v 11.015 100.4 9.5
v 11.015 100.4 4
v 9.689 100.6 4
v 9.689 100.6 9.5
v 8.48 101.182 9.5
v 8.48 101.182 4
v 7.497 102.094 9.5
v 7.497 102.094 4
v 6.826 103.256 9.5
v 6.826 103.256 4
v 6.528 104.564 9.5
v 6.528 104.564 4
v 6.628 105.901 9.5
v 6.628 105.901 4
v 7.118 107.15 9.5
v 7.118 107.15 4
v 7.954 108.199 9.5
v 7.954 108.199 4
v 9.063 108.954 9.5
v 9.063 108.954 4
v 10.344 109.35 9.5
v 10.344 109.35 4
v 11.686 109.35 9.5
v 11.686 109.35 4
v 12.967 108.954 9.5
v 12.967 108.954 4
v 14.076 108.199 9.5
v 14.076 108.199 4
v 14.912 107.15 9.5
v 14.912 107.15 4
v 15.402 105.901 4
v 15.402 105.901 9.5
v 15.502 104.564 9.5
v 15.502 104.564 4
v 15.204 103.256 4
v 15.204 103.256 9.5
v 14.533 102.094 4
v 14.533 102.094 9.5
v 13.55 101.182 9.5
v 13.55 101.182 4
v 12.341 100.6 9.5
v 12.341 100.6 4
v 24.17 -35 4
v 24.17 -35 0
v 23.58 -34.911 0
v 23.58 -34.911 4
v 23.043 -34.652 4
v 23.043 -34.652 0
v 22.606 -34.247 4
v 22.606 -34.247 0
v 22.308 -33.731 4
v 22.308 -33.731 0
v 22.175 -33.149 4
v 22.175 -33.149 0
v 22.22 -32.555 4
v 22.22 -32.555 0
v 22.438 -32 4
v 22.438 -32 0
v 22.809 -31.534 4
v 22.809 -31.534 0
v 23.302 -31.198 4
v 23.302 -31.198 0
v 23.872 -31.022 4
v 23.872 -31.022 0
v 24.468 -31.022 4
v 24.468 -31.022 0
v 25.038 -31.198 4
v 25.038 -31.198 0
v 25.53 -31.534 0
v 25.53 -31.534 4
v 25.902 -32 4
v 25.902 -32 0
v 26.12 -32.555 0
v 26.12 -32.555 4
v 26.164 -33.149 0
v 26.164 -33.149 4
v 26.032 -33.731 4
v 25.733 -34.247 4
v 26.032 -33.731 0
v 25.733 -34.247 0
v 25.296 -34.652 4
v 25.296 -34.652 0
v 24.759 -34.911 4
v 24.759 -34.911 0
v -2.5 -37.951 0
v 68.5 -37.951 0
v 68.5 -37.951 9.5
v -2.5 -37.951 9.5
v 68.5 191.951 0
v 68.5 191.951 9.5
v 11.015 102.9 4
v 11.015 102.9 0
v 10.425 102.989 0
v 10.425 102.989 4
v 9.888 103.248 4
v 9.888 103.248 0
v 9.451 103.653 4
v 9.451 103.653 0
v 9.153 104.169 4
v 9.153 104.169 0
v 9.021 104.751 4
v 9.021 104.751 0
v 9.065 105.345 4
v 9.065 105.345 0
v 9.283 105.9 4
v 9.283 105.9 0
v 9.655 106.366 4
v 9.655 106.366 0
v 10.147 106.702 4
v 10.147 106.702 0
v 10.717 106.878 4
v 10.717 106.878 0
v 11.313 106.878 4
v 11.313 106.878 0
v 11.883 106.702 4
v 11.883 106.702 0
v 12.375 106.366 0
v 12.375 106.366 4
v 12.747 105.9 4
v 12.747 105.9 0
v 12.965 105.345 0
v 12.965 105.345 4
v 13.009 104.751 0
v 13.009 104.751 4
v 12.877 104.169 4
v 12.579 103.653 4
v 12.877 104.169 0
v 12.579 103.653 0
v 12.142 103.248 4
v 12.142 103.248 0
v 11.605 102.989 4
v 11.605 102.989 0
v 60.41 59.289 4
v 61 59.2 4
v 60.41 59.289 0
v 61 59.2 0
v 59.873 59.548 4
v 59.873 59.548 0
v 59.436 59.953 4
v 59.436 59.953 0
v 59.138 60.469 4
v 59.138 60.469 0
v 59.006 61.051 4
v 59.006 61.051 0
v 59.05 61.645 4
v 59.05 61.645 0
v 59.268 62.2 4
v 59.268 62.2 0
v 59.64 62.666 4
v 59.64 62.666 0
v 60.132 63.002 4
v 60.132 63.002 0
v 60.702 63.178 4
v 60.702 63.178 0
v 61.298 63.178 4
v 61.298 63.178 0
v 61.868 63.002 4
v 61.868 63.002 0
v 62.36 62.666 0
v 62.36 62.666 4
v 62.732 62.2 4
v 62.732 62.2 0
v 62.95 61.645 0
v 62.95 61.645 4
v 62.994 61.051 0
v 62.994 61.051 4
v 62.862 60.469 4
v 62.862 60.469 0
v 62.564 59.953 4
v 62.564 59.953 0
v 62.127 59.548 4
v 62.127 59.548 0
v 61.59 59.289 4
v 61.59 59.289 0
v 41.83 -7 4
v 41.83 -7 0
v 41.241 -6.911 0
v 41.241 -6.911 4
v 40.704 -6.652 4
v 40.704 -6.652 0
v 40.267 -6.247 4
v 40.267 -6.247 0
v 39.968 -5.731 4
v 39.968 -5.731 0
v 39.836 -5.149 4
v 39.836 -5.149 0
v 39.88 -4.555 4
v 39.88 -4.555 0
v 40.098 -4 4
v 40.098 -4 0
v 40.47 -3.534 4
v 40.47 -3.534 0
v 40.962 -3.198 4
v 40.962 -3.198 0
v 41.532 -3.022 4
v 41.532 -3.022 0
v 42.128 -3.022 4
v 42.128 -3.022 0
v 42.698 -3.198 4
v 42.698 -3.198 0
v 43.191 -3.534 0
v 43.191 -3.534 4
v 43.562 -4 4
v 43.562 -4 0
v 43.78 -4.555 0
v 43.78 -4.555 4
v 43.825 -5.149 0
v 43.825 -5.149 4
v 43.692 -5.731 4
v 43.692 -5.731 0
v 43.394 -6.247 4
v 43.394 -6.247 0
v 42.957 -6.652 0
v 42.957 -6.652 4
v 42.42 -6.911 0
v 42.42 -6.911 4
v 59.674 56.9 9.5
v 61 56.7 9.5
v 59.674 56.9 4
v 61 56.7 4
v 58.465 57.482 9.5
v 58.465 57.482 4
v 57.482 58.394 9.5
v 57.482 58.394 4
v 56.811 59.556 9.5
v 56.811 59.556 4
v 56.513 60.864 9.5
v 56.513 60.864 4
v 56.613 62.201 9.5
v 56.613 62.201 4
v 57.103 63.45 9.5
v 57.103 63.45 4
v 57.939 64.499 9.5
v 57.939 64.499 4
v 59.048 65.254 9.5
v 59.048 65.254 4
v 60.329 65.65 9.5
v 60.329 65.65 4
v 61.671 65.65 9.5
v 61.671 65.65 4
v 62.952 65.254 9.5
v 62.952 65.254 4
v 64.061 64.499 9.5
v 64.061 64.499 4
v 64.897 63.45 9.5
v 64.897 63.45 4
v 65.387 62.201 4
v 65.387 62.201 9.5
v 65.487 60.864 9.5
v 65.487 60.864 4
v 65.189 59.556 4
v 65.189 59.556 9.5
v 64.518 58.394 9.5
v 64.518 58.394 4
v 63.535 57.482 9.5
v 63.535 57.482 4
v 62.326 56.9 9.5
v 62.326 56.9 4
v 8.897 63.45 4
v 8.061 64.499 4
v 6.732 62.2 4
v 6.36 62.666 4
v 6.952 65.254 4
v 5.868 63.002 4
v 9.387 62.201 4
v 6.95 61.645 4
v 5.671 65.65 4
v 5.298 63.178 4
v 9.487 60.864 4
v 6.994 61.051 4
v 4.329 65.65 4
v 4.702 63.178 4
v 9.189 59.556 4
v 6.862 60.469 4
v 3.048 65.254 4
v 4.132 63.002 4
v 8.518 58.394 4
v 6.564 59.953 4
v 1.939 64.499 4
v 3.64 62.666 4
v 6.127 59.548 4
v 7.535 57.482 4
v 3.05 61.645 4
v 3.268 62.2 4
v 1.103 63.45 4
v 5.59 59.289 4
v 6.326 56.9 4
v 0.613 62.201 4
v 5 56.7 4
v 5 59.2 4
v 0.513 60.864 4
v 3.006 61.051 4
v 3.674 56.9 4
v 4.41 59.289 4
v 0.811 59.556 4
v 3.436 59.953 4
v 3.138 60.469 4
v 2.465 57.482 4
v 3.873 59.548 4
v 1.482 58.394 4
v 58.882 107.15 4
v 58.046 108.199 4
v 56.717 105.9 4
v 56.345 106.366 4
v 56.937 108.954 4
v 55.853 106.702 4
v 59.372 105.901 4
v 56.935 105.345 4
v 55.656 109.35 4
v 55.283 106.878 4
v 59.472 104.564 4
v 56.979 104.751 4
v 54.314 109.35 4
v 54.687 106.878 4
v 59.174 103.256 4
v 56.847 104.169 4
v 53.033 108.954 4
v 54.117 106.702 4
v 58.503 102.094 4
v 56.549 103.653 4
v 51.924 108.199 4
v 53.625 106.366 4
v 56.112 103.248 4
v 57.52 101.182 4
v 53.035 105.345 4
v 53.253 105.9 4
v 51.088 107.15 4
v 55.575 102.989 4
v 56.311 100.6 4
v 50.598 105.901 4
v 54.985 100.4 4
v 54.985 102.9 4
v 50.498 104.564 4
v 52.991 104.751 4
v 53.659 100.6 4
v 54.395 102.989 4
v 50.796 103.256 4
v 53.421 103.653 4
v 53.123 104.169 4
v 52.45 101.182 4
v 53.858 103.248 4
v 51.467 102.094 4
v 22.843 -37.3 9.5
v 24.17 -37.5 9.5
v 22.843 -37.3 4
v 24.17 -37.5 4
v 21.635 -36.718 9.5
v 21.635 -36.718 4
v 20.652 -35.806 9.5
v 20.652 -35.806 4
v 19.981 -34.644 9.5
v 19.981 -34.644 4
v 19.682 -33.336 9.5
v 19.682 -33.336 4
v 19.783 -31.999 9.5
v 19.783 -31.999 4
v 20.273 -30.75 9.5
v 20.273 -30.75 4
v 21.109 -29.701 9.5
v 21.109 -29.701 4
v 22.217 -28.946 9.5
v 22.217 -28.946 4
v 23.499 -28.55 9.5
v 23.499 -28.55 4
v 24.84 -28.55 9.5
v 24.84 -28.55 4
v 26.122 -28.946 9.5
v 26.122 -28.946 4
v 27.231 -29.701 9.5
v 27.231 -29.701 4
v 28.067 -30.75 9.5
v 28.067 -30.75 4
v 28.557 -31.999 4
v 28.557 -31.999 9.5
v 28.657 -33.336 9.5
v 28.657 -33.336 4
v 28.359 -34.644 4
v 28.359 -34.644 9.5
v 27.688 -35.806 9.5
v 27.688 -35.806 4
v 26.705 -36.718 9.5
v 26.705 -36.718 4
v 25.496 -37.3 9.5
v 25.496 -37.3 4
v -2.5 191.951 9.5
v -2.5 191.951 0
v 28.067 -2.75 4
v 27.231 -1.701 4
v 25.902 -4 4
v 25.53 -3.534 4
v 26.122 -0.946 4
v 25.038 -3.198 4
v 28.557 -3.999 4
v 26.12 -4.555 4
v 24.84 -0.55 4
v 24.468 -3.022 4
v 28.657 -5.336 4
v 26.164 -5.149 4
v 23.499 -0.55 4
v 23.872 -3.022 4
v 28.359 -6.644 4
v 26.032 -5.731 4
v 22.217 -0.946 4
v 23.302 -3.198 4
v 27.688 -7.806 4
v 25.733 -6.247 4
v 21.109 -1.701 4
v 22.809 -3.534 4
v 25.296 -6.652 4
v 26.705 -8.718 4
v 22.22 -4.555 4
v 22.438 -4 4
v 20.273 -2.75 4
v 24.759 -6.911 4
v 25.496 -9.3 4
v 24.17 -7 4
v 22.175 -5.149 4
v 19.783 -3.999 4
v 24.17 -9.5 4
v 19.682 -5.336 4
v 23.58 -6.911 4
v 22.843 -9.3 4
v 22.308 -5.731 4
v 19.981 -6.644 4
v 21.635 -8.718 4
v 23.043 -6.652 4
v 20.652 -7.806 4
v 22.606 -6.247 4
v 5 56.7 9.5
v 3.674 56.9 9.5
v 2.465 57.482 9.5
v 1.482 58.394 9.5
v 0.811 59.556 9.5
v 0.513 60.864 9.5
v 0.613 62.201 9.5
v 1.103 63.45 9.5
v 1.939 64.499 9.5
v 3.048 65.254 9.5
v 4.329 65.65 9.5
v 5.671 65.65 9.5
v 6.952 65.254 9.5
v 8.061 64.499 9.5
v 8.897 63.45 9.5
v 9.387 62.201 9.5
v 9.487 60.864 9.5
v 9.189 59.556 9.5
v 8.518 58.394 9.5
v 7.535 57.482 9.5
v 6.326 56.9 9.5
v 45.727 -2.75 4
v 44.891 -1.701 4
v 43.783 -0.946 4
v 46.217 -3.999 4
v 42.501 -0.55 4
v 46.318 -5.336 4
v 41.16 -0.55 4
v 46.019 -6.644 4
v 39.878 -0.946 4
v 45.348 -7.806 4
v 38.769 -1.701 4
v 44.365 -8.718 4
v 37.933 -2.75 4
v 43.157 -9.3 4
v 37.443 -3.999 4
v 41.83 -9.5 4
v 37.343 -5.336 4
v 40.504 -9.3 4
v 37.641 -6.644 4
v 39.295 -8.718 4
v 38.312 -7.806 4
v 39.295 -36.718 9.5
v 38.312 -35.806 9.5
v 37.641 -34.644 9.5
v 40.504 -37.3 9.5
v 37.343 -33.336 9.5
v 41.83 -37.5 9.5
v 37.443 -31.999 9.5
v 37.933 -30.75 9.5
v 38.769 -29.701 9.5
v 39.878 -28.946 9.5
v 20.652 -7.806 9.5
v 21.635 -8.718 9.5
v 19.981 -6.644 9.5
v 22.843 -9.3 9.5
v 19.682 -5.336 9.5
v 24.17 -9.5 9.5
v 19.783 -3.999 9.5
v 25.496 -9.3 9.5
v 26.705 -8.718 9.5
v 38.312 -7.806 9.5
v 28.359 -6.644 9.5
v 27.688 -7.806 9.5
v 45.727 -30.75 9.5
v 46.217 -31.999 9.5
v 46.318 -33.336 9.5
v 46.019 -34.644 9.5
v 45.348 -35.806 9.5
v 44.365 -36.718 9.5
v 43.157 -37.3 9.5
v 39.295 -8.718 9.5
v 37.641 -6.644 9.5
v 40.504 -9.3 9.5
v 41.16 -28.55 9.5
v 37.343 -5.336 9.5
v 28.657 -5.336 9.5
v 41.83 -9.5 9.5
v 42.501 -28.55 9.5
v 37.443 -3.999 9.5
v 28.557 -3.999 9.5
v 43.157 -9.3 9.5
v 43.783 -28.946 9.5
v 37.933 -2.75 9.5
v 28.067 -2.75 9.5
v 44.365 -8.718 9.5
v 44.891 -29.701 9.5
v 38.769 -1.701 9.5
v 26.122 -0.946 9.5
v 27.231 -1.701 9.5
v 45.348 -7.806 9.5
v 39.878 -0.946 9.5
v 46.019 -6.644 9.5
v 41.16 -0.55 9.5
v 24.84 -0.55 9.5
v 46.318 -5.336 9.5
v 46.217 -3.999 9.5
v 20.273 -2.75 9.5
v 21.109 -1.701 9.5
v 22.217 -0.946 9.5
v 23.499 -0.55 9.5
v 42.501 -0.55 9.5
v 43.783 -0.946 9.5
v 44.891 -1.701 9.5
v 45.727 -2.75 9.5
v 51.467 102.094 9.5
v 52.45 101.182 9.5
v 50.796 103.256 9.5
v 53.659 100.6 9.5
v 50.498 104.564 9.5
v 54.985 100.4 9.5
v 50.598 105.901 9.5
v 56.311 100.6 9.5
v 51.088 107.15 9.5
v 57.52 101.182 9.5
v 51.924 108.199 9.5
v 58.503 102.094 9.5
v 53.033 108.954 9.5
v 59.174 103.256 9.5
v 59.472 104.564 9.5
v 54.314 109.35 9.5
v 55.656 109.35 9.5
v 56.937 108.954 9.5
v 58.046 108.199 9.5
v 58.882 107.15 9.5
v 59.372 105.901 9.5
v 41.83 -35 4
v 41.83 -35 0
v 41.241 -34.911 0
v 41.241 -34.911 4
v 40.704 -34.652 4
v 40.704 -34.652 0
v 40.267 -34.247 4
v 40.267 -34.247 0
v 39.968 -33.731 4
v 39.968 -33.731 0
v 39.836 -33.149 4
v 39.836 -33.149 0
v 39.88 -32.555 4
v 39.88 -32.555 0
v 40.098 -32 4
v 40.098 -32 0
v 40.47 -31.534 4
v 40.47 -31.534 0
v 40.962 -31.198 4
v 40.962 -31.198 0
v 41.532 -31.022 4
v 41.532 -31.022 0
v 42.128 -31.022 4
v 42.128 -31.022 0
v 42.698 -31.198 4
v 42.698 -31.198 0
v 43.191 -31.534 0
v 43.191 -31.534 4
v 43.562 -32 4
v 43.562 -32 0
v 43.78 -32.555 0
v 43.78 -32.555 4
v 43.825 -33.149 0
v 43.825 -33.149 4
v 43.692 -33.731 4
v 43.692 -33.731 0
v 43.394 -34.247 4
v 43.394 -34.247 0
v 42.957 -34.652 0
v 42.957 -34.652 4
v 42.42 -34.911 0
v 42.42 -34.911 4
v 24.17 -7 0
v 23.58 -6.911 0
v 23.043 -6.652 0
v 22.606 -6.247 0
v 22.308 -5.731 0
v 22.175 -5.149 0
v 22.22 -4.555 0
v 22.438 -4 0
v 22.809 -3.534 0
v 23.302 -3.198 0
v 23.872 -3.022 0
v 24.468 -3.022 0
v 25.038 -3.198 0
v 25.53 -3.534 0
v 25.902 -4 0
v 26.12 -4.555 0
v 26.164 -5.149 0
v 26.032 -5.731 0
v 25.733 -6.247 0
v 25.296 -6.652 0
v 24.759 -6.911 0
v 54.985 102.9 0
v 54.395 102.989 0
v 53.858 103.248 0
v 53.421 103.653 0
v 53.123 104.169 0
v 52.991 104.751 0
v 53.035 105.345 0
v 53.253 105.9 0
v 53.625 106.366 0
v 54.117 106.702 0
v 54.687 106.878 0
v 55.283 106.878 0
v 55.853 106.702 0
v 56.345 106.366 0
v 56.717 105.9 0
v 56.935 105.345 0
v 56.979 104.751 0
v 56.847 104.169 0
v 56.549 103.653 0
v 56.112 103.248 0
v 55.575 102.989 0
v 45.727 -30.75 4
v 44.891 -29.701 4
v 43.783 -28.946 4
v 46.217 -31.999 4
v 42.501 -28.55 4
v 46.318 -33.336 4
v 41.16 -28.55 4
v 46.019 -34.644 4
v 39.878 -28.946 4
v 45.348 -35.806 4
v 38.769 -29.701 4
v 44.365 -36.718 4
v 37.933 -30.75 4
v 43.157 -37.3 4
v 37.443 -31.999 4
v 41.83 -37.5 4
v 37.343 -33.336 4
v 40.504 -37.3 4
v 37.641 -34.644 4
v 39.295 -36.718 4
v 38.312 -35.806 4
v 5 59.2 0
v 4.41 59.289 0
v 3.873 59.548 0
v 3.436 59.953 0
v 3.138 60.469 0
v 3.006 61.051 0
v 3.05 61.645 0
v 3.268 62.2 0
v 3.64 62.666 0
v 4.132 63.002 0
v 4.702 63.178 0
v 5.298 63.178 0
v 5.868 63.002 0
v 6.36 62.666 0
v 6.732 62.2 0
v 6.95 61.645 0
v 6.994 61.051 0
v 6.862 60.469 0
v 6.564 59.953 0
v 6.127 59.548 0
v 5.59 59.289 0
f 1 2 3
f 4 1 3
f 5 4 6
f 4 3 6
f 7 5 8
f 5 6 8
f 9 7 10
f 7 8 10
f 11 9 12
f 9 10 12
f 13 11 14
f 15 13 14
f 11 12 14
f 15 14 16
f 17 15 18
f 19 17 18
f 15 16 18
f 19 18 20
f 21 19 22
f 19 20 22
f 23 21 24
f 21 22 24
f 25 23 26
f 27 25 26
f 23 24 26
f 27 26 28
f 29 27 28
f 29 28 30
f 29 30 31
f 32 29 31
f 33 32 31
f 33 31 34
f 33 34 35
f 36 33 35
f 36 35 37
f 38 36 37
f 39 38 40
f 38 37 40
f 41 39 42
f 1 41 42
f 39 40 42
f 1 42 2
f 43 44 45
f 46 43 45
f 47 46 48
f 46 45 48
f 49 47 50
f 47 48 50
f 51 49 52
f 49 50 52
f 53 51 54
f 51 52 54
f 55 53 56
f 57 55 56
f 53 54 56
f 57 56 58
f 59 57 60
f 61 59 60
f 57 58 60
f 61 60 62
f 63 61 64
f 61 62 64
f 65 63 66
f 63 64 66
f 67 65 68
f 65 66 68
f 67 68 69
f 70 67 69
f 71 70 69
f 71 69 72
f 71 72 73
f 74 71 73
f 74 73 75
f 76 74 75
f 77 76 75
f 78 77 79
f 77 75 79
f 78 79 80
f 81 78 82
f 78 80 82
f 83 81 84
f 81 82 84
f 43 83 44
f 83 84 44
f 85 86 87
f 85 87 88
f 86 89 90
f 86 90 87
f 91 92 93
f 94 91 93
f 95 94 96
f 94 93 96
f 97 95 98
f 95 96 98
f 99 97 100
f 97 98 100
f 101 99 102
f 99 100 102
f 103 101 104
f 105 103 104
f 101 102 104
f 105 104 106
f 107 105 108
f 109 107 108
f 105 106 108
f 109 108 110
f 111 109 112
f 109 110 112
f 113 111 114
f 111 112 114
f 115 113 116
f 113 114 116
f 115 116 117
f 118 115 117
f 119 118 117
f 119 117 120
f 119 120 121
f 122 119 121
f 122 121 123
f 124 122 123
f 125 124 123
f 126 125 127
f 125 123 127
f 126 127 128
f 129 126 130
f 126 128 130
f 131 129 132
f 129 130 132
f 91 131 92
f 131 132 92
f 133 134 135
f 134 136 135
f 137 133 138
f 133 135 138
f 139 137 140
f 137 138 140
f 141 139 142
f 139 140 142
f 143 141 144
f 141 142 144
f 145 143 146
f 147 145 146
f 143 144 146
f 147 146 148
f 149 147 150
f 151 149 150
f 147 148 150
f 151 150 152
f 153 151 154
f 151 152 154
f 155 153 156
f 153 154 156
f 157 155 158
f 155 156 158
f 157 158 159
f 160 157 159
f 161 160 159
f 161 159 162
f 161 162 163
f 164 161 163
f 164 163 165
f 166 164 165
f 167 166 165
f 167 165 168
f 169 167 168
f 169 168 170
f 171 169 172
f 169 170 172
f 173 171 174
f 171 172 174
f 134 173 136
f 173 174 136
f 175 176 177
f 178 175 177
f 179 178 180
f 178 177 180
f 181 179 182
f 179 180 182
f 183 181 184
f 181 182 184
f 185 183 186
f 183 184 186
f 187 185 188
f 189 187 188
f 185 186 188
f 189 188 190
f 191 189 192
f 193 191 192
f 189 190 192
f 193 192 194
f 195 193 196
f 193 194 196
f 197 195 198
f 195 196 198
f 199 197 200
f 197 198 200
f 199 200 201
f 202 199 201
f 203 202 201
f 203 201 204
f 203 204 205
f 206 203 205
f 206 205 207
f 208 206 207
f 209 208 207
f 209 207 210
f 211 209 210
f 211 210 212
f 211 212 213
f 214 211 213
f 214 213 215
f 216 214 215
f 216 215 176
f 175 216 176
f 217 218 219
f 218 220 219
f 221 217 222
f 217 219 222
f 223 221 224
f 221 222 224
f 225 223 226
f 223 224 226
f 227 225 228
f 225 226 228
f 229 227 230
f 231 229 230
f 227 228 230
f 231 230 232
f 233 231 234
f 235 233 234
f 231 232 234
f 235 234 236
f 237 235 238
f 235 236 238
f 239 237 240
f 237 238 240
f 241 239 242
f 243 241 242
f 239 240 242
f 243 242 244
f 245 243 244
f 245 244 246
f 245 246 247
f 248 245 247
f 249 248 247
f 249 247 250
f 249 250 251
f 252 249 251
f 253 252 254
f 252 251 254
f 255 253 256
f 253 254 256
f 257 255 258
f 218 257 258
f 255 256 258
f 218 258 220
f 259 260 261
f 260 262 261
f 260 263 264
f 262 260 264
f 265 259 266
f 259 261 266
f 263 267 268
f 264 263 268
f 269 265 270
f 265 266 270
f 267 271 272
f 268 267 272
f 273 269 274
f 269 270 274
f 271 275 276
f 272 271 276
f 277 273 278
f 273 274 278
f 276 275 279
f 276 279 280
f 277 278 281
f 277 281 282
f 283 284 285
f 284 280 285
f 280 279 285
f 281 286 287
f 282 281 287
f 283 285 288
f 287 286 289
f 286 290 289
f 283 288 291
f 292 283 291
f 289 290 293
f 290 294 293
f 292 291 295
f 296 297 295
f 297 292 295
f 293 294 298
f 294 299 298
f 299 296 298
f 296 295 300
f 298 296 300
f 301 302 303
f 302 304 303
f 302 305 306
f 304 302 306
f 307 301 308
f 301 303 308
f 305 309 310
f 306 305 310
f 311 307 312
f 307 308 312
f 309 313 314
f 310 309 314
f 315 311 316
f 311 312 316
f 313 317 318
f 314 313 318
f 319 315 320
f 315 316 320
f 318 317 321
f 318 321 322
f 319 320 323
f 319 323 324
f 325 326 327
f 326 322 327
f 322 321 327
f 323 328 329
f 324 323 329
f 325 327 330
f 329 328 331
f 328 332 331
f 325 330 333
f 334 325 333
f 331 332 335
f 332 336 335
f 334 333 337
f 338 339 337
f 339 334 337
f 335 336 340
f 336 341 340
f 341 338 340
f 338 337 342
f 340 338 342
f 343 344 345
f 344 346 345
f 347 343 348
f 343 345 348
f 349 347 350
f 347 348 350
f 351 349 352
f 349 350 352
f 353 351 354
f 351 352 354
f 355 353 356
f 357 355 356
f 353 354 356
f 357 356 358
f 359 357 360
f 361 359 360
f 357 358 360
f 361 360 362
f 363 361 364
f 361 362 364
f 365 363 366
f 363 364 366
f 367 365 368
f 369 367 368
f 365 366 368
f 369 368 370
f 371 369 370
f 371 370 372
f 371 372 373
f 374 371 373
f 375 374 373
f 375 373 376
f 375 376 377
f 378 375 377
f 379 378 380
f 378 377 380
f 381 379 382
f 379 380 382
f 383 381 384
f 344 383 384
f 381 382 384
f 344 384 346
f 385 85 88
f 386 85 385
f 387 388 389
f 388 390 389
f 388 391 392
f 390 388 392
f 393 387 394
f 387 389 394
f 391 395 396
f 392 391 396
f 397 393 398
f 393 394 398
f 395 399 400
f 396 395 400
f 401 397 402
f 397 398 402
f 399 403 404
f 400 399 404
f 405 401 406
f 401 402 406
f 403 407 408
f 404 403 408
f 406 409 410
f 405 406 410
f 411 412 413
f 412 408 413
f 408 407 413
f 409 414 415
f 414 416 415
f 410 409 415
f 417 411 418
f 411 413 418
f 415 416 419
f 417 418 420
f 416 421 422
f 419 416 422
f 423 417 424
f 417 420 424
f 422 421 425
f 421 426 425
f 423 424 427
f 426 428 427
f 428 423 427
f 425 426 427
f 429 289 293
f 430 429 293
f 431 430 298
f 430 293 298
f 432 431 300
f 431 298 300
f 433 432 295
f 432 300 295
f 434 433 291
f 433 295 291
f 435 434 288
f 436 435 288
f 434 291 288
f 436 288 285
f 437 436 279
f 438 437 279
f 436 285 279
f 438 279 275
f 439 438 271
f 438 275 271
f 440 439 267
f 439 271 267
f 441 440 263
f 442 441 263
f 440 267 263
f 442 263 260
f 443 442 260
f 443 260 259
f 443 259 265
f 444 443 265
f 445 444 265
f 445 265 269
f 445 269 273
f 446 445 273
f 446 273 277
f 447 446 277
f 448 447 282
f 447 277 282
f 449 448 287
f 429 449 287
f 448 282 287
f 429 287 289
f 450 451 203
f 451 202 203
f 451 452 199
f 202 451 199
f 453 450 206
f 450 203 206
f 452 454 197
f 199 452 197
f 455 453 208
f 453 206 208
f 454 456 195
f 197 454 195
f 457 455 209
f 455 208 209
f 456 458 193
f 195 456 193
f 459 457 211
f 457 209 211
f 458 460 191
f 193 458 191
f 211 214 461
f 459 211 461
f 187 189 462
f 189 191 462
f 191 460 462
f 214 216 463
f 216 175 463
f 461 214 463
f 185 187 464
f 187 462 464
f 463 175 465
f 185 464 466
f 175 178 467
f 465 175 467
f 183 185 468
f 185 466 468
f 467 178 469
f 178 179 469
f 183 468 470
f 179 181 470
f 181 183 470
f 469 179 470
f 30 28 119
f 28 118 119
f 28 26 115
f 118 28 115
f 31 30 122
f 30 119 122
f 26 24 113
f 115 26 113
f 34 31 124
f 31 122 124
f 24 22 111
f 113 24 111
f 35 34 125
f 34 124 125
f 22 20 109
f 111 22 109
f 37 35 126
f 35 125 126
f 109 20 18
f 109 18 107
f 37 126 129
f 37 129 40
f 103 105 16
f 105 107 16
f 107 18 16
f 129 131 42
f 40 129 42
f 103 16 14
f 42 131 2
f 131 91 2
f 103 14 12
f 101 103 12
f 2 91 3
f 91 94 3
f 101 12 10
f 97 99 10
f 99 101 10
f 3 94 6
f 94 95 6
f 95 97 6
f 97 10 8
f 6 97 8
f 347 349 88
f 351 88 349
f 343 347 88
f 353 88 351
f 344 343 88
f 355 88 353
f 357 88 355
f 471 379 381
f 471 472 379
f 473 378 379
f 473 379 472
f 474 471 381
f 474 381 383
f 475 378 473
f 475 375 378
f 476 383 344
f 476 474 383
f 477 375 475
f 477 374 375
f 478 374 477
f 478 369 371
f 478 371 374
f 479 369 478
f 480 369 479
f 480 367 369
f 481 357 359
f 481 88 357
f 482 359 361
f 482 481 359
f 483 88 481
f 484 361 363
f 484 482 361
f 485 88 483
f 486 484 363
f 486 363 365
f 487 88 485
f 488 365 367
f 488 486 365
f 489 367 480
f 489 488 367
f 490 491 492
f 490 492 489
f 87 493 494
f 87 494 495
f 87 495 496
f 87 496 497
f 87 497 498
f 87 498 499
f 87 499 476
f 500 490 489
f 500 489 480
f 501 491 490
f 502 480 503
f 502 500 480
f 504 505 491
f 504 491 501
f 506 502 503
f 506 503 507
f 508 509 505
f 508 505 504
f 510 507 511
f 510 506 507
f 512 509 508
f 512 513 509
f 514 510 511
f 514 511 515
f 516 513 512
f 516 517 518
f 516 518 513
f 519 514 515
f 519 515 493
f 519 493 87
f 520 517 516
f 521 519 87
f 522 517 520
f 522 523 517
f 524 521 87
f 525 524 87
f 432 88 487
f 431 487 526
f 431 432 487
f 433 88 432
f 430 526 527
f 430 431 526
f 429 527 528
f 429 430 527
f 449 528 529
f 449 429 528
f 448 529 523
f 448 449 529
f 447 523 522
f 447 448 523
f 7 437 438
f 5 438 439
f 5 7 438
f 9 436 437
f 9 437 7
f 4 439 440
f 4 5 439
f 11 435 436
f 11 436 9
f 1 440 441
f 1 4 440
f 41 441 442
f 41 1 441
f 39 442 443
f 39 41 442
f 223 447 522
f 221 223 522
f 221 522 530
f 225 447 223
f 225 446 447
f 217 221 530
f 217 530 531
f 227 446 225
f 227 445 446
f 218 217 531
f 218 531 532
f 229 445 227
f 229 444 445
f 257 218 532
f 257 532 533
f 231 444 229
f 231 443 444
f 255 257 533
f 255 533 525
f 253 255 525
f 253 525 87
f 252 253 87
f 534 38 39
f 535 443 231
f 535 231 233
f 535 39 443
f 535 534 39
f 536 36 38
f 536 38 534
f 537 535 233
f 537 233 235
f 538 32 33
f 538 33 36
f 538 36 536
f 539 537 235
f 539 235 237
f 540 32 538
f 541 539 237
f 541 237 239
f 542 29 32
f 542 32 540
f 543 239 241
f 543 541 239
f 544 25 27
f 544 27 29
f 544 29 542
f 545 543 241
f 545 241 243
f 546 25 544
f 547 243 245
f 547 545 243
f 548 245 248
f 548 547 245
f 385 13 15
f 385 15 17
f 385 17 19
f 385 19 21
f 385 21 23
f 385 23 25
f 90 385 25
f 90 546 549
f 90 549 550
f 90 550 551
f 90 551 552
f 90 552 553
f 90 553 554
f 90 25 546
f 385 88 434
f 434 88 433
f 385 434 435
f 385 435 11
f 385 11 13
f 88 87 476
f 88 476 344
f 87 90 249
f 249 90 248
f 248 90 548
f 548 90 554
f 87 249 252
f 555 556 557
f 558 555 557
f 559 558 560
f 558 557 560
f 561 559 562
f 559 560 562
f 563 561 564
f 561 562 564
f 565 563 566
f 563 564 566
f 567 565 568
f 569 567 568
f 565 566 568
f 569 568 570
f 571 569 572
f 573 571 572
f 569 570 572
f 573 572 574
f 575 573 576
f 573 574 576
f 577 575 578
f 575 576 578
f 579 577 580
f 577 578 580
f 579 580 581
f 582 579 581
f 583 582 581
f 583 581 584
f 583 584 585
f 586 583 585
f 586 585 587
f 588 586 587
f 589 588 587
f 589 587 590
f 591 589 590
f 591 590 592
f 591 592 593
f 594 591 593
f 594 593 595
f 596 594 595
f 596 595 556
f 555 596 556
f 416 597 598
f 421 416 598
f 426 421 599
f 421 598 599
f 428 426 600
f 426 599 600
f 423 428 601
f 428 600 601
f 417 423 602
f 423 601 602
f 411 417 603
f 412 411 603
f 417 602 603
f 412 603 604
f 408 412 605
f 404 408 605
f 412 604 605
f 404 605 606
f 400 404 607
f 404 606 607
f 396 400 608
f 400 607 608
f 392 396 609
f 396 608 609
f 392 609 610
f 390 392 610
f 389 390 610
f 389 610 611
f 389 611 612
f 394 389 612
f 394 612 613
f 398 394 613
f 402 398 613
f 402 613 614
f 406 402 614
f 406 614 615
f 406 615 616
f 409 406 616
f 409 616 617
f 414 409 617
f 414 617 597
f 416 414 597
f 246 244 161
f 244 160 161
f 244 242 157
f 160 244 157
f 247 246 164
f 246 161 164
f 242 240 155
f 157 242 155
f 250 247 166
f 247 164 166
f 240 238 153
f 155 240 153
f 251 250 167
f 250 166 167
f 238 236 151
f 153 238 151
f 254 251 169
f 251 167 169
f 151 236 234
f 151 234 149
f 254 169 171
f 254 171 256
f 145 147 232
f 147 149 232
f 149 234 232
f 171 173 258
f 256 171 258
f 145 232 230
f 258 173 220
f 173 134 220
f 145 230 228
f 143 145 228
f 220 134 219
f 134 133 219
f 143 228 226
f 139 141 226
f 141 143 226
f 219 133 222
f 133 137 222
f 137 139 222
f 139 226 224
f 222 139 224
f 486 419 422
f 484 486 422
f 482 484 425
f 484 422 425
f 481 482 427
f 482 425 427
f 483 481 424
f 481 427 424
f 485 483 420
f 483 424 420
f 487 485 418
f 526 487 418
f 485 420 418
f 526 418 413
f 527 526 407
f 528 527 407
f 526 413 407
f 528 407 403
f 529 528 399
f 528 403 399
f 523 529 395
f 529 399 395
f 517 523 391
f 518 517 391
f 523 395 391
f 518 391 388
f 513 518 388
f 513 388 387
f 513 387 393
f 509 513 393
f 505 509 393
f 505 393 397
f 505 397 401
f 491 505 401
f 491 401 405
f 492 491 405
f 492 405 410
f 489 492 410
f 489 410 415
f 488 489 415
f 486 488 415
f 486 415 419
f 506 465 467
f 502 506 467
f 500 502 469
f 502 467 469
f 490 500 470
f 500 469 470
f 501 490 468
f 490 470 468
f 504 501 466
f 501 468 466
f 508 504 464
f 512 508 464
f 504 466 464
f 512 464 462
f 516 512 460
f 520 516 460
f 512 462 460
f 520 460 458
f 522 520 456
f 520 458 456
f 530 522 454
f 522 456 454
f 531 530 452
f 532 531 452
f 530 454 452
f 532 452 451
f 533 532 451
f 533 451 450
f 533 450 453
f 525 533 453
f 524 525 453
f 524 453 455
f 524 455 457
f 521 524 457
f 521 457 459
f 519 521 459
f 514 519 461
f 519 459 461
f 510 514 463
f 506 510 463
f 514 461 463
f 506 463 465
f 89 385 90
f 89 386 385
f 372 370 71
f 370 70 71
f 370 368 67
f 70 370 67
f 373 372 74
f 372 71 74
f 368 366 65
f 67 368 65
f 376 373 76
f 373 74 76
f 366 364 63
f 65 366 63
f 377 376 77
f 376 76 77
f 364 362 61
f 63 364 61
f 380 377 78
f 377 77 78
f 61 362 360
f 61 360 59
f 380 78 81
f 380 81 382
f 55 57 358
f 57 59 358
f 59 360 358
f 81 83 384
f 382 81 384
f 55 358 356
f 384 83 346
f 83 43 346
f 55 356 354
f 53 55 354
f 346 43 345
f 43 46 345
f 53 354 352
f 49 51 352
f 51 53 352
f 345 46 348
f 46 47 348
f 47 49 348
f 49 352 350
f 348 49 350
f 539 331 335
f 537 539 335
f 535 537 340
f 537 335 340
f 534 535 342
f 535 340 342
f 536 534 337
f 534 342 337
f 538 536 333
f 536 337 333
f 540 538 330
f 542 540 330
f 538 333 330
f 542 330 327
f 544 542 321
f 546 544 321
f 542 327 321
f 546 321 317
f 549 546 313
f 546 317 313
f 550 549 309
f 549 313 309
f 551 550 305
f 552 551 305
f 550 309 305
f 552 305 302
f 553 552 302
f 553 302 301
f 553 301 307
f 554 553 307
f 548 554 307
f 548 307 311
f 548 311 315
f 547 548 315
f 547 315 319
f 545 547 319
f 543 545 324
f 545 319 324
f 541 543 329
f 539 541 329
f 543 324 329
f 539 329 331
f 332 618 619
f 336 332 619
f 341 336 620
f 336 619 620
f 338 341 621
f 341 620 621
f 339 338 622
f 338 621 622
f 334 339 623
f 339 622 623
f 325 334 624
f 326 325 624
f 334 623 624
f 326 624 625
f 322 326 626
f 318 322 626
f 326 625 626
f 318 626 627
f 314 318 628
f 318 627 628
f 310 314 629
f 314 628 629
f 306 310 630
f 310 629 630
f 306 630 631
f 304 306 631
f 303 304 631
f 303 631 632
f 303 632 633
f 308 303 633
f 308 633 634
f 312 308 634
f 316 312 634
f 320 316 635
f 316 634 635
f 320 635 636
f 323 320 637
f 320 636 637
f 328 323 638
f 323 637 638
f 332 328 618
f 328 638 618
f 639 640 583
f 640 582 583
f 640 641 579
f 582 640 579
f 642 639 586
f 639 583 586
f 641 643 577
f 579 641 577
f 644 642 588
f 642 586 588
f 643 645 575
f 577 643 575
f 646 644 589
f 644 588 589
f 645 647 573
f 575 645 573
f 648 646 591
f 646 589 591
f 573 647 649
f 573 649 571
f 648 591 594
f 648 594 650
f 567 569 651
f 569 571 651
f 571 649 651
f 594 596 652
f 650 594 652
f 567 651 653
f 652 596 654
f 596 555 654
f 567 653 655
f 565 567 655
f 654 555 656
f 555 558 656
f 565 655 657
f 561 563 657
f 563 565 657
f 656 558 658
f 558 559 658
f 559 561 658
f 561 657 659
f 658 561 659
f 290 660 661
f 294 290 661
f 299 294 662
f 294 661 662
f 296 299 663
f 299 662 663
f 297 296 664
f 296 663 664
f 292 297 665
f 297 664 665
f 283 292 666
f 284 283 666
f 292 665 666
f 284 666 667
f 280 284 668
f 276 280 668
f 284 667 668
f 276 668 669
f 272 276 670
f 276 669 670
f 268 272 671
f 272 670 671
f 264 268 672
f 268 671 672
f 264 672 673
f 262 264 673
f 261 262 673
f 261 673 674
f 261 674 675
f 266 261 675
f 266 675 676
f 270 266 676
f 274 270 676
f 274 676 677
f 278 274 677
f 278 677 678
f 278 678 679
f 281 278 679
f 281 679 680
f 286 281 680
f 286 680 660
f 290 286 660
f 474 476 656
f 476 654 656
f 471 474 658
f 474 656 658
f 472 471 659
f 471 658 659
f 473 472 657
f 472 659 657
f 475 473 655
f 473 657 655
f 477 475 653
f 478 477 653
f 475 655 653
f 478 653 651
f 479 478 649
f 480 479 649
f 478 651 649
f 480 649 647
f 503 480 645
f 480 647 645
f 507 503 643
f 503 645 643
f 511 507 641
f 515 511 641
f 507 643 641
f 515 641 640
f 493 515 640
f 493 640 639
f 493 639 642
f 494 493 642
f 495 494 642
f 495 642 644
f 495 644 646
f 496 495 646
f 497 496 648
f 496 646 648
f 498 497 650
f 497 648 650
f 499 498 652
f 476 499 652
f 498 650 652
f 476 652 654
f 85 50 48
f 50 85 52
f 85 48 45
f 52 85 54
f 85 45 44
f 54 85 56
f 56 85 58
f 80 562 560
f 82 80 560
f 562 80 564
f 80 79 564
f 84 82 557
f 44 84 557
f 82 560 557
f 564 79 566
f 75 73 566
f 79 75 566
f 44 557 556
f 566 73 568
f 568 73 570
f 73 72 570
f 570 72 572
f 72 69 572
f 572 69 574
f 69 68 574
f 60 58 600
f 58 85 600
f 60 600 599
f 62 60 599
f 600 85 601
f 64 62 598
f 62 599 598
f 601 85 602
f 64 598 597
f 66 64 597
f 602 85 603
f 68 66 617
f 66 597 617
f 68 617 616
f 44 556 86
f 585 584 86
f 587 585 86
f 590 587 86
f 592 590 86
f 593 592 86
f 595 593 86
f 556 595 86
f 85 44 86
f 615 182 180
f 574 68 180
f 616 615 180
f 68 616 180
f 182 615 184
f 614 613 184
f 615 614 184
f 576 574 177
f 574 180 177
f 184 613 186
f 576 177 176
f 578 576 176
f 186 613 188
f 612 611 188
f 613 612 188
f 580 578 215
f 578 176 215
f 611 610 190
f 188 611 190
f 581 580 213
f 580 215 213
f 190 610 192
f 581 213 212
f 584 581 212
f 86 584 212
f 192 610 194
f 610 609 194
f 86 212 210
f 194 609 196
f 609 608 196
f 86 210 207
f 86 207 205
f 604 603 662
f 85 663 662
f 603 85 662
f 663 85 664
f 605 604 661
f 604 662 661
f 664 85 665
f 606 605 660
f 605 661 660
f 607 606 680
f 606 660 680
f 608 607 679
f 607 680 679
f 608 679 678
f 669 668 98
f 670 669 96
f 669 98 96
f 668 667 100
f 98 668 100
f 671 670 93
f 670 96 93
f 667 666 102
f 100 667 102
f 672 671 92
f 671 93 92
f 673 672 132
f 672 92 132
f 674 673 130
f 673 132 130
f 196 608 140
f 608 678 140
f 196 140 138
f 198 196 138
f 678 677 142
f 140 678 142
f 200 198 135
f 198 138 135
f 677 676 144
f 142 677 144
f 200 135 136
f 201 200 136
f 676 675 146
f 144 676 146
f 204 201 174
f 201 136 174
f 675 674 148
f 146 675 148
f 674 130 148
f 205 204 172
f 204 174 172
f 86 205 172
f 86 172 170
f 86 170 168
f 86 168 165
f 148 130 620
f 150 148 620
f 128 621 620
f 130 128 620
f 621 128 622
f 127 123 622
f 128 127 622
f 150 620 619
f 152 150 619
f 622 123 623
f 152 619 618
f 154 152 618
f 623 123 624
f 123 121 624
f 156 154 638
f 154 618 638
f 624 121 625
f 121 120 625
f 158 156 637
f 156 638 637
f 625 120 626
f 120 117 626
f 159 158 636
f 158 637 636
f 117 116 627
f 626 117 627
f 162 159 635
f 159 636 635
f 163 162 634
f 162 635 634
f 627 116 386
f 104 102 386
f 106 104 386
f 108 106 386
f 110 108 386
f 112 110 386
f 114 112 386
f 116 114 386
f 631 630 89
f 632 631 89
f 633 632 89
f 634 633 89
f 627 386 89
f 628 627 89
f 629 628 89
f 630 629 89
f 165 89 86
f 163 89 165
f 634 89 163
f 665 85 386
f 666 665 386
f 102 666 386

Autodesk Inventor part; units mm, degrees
ref_plane "YZ Plane" through (0, 0, 0) normal (1, 0, 0) x (0, 1, 0)
ref_plane "XZ Plane" through (0, 0, 0) normal (0, 1, 0) x (-1, 0, 0)
ref_plane "XY Plane" through (0, 0, 0) normal (0, 0, 1) x (1, 0, 0)
sketch "Esboço2" plane through (0, 0, 0) normal (0, 0, 1) x (1, 0, 0)
  line L0 (-1.4393, 191.951) -> (-2.5, 191.951) construction
  line L1 (-2.5, 191.951) -> (-2.5, 190.8903) construction
  line L2 (67.4393, -37.951) -> (68.5, -37.951) construction
  line L3 (68.5, -37.951) -> (68.5, -36.8903) construction
  line L4 (-2.5, 191.951) -> (68.5, 191.951)
  line L5 (68.5, 191.951) -> (68.5, -37.951)
  line L6 (68.5, -37.951) -> (-2.5, -37.951)
  line L7 (-2.5, -37.951) -> (-2.5, 191.951)
  point P0 (0, 0)
  dimension "d14" = 71
extrude "Extrusão2" add sketch "Esboço2" along normal blind 9.5
sketch "Esboço3" plane through (0, 0, 9.5) normal (0, 0, 1) x (1, 0, 0)
  point P0 (0, 0)
  point P1 (41.8302, -5)
  point P2 (24.1698, -5)
  point P3 (41.8302, -33)
  point P4 (24.1698, -33)
  point P5 (54.985, 104.9)
  point P6 (11.015, 104.9)
  point P7 (5, 61.2)
  point P8 (61, 61.2)
hole "Furo1" at (11.015, 104.9, 9.5) at (54.985, 104.9, 9.5) at (5, 61.2, 9.5) at (61, 61.2, 9.5) at (24.1698, -5, 9.5) at (41.8302, -5, 9.5) at (24.1698, -33, 9.5) at (41.8302, -33, 9.5) direction (0, 0, -1) diameter 4 end through all counterbore diameter 9 counterbore depth 5.5
properties part number "suporte_cabeça_superior"
